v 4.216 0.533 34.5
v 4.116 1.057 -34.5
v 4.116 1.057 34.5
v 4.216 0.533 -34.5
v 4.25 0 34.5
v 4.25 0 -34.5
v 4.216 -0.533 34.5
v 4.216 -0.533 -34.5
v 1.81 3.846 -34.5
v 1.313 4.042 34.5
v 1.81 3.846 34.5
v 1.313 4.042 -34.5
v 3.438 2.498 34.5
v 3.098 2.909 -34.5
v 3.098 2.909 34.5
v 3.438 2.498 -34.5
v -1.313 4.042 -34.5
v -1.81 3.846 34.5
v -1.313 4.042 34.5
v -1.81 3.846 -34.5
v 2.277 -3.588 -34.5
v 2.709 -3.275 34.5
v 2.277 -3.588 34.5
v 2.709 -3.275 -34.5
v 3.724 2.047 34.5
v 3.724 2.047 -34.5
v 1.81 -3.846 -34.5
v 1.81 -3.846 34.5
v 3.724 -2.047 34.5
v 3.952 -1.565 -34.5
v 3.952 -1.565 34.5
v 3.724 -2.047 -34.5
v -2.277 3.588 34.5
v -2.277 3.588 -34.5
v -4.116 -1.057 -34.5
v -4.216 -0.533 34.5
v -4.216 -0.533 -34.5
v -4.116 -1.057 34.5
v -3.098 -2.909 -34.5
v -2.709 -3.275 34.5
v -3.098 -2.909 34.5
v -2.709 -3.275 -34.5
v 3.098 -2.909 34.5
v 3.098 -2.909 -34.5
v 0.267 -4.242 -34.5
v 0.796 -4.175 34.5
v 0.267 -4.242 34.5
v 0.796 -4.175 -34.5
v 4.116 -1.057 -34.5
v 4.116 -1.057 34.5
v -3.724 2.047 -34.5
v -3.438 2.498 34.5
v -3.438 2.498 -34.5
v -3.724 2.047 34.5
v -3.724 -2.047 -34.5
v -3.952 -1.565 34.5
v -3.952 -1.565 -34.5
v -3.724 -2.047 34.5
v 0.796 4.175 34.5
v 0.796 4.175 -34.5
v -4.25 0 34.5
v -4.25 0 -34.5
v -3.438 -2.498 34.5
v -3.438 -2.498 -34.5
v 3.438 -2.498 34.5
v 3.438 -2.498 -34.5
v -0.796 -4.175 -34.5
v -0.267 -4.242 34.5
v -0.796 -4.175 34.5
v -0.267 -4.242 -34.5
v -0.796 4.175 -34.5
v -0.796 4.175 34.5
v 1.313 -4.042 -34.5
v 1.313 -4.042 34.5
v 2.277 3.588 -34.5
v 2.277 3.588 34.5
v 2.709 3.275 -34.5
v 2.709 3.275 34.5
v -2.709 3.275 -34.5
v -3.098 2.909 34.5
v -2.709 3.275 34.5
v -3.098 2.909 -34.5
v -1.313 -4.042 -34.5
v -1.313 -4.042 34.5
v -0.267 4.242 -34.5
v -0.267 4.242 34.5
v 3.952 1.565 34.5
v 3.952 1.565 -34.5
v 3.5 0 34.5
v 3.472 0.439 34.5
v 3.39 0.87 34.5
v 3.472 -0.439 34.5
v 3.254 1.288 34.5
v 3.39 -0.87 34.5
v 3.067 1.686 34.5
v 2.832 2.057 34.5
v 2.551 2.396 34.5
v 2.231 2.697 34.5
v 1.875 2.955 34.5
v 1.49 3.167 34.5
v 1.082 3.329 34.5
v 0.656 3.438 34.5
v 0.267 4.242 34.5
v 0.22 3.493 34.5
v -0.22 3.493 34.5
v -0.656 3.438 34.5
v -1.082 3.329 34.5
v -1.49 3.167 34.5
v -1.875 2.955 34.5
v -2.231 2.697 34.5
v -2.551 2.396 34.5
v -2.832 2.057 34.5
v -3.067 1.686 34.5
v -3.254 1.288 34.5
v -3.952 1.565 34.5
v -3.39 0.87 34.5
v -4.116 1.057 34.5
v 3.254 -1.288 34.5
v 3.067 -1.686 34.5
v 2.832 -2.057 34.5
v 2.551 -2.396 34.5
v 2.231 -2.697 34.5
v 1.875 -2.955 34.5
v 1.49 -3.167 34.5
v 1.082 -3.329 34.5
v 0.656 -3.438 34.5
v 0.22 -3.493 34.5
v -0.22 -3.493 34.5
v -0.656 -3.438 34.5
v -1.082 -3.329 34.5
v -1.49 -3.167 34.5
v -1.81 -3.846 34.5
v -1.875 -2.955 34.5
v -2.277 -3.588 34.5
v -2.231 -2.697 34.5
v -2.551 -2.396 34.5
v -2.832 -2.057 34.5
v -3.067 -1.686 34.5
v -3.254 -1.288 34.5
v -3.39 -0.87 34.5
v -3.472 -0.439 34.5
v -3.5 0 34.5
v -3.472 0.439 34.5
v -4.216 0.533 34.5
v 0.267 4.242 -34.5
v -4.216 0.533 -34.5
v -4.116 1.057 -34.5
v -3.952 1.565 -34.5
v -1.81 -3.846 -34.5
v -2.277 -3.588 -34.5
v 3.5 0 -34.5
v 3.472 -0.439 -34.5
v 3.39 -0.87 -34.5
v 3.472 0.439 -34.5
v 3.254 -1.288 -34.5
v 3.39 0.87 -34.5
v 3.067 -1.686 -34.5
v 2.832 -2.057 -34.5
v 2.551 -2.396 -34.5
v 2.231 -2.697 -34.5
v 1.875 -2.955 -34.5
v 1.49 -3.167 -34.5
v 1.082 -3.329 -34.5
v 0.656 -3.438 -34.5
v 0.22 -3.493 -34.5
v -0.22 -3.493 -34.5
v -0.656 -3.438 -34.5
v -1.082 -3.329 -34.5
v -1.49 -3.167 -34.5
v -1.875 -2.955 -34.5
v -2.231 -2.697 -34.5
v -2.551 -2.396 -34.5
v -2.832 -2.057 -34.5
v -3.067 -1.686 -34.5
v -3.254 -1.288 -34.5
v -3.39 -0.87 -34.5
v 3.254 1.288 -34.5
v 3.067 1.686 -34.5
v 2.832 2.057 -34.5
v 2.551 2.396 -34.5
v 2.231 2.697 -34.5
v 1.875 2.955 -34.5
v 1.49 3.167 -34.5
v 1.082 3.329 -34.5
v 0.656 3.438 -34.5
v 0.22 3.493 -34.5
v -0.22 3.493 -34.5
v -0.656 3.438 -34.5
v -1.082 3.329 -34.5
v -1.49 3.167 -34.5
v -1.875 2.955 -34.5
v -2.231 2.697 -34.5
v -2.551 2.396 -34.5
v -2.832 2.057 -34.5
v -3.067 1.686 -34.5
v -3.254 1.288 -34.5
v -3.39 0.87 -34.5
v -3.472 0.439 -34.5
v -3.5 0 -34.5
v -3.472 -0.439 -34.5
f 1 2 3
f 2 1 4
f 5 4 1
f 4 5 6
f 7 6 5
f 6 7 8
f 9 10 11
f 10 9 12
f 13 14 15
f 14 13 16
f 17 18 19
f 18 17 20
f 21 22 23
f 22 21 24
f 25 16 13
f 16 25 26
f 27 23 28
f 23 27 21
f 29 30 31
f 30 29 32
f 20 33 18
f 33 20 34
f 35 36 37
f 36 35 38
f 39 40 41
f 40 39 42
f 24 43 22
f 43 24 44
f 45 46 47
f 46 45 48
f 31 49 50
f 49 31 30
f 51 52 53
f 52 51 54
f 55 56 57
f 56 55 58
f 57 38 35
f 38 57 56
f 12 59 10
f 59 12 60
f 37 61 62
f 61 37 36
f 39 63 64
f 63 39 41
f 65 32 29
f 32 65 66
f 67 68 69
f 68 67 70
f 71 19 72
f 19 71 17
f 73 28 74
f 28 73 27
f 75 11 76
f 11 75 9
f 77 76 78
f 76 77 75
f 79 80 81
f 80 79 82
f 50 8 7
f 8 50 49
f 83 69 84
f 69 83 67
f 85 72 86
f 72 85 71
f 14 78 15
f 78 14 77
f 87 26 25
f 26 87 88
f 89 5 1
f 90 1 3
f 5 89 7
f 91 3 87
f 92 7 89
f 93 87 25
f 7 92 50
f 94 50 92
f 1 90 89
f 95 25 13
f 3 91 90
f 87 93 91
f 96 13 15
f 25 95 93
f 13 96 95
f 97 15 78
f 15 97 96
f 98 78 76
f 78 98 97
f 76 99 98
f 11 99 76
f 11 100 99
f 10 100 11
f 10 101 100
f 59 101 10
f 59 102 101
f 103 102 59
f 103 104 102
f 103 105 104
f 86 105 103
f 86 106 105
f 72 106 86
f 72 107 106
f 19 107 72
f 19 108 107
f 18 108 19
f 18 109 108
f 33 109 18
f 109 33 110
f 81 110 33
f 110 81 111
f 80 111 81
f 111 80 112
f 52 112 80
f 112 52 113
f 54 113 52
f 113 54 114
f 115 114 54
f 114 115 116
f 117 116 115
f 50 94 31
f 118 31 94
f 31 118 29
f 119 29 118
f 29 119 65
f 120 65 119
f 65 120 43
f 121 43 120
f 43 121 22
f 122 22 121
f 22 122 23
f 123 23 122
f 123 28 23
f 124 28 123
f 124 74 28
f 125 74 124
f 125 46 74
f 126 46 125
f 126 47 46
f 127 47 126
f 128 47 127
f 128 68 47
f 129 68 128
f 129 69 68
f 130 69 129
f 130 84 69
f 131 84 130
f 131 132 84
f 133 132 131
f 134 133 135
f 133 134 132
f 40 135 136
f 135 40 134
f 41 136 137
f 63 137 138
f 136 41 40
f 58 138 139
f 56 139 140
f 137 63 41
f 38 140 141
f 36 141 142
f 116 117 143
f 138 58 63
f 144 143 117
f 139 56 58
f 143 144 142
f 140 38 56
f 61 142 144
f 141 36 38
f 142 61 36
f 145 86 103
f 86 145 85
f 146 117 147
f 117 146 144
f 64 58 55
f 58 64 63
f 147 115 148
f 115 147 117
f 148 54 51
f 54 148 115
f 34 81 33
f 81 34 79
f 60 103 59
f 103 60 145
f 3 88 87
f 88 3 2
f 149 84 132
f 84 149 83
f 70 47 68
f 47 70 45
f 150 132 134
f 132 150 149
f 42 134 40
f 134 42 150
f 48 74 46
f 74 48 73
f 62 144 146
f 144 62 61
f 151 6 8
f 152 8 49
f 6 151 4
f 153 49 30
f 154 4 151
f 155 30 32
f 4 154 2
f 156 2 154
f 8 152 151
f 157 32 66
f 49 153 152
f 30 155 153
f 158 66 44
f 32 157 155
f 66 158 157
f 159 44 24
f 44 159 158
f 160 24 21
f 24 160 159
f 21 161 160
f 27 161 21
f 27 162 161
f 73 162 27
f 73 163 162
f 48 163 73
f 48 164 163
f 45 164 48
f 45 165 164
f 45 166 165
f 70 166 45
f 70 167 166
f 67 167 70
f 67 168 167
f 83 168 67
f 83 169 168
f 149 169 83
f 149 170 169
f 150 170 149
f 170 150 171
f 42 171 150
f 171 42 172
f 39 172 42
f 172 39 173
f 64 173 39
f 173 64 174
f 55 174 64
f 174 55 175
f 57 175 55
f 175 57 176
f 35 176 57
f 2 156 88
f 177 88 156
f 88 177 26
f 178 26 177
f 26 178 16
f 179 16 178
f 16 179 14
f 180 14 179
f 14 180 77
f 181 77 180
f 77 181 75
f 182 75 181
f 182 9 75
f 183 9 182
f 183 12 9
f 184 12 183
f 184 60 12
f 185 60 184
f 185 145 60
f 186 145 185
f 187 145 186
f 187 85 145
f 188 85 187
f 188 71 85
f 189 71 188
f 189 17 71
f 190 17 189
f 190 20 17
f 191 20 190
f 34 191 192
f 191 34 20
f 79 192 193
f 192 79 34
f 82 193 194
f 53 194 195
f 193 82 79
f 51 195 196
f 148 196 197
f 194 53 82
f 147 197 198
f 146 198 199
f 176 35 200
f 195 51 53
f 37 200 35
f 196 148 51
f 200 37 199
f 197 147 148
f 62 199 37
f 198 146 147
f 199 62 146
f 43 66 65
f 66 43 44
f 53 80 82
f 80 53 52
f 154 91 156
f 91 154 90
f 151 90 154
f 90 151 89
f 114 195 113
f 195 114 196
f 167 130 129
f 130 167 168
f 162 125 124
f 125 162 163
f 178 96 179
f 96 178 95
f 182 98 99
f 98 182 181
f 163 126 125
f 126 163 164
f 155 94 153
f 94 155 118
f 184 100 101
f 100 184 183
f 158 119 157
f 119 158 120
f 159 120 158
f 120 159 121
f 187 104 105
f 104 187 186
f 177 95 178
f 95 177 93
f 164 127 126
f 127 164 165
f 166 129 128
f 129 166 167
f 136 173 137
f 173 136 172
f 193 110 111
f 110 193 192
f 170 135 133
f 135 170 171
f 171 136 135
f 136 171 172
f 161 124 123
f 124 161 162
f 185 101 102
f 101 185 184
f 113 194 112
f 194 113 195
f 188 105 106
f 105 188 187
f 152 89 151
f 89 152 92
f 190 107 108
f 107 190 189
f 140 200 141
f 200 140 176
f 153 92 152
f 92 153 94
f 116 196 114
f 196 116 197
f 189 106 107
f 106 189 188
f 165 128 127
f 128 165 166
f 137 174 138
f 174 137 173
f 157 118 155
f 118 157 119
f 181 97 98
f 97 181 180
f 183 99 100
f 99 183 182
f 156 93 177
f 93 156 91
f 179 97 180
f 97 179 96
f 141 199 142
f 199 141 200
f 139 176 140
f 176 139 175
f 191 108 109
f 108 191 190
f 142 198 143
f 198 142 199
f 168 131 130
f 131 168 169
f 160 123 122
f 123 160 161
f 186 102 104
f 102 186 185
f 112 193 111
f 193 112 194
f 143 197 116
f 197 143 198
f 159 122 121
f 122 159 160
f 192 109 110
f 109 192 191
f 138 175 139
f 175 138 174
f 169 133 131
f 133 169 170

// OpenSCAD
$fn = 50;


difference() {
	union() {
		translate(v = [0, 0, -34.5000000000]) {
			cylinder(h = 69, r = 4.2500000000);
		}
	}
	union() {
		translate(v = [0, 0, -100.0000000000]) {
			cylinder(h = 200, r = 3.5000000000);
		}
	}
}
